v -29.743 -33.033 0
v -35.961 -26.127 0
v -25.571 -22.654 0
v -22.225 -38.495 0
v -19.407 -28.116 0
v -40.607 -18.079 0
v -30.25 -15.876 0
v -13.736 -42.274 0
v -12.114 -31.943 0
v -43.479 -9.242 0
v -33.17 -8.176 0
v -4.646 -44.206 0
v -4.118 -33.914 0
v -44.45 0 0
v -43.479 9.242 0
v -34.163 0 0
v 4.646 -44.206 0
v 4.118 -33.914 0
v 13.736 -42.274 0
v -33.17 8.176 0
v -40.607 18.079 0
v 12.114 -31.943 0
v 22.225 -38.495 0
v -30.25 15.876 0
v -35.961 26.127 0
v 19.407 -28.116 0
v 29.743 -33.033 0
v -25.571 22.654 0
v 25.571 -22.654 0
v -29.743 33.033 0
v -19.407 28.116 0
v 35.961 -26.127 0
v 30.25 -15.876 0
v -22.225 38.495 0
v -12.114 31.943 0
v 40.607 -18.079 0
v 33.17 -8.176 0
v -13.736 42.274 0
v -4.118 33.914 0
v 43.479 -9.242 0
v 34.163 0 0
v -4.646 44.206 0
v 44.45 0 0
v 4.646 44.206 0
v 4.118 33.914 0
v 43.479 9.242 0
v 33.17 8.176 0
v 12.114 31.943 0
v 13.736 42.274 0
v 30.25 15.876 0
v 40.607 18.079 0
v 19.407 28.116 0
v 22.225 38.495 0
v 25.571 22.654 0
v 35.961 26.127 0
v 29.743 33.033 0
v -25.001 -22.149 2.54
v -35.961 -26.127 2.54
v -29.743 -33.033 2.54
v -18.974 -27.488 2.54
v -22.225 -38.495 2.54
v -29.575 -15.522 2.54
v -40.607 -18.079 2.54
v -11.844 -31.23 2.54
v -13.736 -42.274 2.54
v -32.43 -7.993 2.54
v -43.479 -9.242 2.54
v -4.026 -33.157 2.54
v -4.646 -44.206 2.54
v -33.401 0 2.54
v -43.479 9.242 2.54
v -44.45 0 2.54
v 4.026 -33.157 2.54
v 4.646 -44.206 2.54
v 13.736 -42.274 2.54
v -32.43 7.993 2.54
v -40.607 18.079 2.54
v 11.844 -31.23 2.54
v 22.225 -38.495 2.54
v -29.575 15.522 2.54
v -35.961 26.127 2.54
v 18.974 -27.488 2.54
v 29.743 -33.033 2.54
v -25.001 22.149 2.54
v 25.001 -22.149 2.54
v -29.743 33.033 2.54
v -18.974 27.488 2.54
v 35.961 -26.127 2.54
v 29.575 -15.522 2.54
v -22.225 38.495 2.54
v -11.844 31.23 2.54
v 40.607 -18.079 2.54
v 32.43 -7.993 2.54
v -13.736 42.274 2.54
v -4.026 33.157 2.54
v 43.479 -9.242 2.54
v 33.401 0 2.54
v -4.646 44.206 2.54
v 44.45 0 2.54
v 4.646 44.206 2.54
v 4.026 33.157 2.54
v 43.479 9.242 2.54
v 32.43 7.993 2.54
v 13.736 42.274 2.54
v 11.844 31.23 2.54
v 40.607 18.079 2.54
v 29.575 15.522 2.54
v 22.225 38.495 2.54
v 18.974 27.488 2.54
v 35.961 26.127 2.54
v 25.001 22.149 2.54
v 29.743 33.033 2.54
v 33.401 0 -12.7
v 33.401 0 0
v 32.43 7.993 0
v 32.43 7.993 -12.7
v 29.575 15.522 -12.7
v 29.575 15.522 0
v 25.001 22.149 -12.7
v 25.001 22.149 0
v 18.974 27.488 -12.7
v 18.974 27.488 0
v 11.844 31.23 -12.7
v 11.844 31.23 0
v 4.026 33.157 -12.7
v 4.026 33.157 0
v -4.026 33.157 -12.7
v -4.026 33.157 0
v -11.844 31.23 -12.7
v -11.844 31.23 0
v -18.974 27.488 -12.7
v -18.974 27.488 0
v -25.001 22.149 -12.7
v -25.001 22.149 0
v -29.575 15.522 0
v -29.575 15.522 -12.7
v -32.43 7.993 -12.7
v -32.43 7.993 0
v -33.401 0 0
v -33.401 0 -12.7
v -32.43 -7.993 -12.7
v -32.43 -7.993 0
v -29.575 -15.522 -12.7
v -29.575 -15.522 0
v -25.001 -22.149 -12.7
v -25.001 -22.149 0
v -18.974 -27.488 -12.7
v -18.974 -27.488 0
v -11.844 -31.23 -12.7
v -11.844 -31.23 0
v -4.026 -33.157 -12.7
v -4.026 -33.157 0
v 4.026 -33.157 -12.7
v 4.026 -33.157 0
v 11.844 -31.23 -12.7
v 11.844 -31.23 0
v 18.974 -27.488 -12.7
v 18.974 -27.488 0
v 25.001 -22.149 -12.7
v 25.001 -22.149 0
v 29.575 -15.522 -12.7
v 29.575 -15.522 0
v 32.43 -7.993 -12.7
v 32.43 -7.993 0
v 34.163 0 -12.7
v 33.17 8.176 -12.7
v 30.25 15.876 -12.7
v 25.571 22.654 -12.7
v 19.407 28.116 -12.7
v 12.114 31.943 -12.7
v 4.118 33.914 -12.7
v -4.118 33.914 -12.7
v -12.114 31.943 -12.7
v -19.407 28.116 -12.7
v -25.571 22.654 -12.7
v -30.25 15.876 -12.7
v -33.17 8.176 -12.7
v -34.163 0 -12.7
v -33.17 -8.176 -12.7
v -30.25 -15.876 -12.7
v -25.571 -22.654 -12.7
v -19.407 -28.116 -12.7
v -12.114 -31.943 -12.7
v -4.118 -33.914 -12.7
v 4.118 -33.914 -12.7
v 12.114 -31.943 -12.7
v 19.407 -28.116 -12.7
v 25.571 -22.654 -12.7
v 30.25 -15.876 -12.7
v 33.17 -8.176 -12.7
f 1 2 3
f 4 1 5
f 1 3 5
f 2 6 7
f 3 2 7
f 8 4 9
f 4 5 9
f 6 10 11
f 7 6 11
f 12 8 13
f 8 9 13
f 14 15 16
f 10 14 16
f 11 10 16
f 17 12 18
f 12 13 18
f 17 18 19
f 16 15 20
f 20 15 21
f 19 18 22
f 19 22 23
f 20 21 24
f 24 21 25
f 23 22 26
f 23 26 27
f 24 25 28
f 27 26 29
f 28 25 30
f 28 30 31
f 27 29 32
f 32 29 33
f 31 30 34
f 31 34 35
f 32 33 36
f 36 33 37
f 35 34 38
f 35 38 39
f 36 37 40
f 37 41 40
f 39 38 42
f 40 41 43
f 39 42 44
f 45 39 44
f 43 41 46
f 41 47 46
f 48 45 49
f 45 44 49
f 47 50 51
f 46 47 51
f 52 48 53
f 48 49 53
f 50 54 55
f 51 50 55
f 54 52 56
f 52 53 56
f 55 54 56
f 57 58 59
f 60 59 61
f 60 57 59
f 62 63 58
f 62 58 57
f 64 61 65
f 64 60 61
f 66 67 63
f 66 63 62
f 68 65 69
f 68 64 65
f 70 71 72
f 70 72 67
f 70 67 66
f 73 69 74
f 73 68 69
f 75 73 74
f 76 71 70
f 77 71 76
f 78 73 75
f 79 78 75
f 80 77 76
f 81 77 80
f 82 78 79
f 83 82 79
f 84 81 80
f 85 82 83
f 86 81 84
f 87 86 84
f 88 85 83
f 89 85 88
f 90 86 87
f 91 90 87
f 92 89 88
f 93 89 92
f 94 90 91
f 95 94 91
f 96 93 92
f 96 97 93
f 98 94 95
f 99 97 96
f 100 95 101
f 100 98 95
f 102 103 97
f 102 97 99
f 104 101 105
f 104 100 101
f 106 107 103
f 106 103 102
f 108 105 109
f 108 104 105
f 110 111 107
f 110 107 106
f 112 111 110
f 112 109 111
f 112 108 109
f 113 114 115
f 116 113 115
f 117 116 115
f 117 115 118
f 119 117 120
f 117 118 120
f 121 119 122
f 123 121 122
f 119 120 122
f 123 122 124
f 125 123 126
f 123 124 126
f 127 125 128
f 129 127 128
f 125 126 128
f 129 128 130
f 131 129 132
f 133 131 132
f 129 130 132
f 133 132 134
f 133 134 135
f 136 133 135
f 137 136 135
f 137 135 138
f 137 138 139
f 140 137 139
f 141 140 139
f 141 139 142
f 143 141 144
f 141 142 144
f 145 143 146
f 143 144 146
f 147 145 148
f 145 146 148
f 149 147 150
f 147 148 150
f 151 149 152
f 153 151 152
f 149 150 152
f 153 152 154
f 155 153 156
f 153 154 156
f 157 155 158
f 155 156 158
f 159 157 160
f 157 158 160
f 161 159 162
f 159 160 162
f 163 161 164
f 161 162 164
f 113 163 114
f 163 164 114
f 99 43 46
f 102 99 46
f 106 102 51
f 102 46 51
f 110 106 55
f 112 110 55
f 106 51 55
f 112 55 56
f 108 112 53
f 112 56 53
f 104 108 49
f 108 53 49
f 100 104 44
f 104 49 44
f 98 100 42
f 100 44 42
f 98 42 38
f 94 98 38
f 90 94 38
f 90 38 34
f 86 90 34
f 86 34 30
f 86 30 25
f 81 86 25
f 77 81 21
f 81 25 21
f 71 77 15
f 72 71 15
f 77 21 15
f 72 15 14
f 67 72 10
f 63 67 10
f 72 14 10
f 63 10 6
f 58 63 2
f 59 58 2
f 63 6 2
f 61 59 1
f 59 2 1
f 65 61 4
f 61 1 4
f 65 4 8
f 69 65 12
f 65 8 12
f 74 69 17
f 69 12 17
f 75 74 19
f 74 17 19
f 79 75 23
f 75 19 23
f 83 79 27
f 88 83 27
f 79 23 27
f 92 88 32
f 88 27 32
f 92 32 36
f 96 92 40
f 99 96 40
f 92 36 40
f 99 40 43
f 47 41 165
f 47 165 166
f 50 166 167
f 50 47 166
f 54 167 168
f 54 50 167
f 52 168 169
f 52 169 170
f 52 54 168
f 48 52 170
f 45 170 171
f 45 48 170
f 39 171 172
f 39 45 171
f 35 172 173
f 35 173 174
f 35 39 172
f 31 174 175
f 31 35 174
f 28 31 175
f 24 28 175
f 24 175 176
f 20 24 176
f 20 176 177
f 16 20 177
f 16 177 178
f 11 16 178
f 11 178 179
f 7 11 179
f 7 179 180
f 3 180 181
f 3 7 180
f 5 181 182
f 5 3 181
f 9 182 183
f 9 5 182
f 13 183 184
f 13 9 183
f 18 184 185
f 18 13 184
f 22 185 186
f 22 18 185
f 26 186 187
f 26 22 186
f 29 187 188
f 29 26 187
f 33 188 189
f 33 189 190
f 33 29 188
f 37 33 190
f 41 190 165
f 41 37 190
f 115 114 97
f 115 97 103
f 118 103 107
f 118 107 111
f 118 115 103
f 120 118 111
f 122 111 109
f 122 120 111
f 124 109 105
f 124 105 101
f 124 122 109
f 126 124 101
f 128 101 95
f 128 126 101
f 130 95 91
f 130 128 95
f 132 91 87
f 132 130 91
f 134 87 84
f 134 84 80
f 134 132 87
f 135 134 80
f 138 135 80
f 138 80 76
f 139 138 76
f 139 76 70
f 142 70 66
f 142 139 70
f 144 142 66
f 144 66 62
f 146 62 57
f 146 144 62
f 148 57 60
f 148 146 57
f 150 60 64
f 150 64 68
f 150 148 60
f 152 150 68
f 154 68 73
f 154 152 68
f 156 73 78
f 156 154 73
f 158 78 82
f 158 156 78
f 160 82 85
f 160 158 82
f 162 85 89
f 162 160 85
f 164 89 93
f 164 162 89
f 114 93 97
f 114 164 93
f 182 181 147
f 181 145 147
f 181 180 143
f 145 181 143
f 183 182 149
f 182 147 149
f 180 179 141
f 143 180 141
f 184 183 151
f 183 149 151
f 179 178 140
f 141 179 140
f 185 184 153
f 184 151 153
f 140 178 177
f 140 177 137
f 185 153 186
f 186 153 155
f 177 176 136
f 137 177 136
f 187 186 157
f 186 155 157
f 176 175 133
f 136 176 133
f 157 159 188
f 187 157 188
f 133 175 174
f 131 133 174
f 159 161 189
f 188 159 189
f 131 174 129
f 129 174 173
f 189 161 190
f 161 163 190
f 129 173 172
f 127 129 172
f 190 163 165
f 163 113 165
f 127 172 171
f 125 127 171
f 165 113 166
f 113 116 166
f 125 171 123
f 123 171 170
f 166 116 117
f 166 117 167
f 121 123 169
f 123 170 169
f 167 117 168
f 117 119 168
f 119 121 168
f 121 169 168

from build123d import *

# Parameters (mm, degrees)
F0_R          = 44.45
F0_R_2        = 34.163
F1_DEPTH      = 2.54
F0_R_3        = 33.401
F2_DEPTH      = 2.54
F2_DEPTH_BACK = 12.7


with BuildPart() as f1:
    # F0 (on Top) → F1 (new body)
    with BuildSketch(Plane.XY):
        Circle(F0_R)
        Circle(F0_R_2, mode=Mode.SUBTRACT)
    extrude(amount=F1_DEPTH)

    # F0 (on Top) → F2 (join, two sides)
    with BuildSketch(Plane.XY) as f2_sk:
        Circle(F0_R_2)
        Circle(F0_R_3, mode=Mode.SUBTRACT)
    extrude(amount=F2_DEPTH)
    extrude(f2_sk.sketch, amount=-F2_DEPTH_BACK)


solid = f1.part
